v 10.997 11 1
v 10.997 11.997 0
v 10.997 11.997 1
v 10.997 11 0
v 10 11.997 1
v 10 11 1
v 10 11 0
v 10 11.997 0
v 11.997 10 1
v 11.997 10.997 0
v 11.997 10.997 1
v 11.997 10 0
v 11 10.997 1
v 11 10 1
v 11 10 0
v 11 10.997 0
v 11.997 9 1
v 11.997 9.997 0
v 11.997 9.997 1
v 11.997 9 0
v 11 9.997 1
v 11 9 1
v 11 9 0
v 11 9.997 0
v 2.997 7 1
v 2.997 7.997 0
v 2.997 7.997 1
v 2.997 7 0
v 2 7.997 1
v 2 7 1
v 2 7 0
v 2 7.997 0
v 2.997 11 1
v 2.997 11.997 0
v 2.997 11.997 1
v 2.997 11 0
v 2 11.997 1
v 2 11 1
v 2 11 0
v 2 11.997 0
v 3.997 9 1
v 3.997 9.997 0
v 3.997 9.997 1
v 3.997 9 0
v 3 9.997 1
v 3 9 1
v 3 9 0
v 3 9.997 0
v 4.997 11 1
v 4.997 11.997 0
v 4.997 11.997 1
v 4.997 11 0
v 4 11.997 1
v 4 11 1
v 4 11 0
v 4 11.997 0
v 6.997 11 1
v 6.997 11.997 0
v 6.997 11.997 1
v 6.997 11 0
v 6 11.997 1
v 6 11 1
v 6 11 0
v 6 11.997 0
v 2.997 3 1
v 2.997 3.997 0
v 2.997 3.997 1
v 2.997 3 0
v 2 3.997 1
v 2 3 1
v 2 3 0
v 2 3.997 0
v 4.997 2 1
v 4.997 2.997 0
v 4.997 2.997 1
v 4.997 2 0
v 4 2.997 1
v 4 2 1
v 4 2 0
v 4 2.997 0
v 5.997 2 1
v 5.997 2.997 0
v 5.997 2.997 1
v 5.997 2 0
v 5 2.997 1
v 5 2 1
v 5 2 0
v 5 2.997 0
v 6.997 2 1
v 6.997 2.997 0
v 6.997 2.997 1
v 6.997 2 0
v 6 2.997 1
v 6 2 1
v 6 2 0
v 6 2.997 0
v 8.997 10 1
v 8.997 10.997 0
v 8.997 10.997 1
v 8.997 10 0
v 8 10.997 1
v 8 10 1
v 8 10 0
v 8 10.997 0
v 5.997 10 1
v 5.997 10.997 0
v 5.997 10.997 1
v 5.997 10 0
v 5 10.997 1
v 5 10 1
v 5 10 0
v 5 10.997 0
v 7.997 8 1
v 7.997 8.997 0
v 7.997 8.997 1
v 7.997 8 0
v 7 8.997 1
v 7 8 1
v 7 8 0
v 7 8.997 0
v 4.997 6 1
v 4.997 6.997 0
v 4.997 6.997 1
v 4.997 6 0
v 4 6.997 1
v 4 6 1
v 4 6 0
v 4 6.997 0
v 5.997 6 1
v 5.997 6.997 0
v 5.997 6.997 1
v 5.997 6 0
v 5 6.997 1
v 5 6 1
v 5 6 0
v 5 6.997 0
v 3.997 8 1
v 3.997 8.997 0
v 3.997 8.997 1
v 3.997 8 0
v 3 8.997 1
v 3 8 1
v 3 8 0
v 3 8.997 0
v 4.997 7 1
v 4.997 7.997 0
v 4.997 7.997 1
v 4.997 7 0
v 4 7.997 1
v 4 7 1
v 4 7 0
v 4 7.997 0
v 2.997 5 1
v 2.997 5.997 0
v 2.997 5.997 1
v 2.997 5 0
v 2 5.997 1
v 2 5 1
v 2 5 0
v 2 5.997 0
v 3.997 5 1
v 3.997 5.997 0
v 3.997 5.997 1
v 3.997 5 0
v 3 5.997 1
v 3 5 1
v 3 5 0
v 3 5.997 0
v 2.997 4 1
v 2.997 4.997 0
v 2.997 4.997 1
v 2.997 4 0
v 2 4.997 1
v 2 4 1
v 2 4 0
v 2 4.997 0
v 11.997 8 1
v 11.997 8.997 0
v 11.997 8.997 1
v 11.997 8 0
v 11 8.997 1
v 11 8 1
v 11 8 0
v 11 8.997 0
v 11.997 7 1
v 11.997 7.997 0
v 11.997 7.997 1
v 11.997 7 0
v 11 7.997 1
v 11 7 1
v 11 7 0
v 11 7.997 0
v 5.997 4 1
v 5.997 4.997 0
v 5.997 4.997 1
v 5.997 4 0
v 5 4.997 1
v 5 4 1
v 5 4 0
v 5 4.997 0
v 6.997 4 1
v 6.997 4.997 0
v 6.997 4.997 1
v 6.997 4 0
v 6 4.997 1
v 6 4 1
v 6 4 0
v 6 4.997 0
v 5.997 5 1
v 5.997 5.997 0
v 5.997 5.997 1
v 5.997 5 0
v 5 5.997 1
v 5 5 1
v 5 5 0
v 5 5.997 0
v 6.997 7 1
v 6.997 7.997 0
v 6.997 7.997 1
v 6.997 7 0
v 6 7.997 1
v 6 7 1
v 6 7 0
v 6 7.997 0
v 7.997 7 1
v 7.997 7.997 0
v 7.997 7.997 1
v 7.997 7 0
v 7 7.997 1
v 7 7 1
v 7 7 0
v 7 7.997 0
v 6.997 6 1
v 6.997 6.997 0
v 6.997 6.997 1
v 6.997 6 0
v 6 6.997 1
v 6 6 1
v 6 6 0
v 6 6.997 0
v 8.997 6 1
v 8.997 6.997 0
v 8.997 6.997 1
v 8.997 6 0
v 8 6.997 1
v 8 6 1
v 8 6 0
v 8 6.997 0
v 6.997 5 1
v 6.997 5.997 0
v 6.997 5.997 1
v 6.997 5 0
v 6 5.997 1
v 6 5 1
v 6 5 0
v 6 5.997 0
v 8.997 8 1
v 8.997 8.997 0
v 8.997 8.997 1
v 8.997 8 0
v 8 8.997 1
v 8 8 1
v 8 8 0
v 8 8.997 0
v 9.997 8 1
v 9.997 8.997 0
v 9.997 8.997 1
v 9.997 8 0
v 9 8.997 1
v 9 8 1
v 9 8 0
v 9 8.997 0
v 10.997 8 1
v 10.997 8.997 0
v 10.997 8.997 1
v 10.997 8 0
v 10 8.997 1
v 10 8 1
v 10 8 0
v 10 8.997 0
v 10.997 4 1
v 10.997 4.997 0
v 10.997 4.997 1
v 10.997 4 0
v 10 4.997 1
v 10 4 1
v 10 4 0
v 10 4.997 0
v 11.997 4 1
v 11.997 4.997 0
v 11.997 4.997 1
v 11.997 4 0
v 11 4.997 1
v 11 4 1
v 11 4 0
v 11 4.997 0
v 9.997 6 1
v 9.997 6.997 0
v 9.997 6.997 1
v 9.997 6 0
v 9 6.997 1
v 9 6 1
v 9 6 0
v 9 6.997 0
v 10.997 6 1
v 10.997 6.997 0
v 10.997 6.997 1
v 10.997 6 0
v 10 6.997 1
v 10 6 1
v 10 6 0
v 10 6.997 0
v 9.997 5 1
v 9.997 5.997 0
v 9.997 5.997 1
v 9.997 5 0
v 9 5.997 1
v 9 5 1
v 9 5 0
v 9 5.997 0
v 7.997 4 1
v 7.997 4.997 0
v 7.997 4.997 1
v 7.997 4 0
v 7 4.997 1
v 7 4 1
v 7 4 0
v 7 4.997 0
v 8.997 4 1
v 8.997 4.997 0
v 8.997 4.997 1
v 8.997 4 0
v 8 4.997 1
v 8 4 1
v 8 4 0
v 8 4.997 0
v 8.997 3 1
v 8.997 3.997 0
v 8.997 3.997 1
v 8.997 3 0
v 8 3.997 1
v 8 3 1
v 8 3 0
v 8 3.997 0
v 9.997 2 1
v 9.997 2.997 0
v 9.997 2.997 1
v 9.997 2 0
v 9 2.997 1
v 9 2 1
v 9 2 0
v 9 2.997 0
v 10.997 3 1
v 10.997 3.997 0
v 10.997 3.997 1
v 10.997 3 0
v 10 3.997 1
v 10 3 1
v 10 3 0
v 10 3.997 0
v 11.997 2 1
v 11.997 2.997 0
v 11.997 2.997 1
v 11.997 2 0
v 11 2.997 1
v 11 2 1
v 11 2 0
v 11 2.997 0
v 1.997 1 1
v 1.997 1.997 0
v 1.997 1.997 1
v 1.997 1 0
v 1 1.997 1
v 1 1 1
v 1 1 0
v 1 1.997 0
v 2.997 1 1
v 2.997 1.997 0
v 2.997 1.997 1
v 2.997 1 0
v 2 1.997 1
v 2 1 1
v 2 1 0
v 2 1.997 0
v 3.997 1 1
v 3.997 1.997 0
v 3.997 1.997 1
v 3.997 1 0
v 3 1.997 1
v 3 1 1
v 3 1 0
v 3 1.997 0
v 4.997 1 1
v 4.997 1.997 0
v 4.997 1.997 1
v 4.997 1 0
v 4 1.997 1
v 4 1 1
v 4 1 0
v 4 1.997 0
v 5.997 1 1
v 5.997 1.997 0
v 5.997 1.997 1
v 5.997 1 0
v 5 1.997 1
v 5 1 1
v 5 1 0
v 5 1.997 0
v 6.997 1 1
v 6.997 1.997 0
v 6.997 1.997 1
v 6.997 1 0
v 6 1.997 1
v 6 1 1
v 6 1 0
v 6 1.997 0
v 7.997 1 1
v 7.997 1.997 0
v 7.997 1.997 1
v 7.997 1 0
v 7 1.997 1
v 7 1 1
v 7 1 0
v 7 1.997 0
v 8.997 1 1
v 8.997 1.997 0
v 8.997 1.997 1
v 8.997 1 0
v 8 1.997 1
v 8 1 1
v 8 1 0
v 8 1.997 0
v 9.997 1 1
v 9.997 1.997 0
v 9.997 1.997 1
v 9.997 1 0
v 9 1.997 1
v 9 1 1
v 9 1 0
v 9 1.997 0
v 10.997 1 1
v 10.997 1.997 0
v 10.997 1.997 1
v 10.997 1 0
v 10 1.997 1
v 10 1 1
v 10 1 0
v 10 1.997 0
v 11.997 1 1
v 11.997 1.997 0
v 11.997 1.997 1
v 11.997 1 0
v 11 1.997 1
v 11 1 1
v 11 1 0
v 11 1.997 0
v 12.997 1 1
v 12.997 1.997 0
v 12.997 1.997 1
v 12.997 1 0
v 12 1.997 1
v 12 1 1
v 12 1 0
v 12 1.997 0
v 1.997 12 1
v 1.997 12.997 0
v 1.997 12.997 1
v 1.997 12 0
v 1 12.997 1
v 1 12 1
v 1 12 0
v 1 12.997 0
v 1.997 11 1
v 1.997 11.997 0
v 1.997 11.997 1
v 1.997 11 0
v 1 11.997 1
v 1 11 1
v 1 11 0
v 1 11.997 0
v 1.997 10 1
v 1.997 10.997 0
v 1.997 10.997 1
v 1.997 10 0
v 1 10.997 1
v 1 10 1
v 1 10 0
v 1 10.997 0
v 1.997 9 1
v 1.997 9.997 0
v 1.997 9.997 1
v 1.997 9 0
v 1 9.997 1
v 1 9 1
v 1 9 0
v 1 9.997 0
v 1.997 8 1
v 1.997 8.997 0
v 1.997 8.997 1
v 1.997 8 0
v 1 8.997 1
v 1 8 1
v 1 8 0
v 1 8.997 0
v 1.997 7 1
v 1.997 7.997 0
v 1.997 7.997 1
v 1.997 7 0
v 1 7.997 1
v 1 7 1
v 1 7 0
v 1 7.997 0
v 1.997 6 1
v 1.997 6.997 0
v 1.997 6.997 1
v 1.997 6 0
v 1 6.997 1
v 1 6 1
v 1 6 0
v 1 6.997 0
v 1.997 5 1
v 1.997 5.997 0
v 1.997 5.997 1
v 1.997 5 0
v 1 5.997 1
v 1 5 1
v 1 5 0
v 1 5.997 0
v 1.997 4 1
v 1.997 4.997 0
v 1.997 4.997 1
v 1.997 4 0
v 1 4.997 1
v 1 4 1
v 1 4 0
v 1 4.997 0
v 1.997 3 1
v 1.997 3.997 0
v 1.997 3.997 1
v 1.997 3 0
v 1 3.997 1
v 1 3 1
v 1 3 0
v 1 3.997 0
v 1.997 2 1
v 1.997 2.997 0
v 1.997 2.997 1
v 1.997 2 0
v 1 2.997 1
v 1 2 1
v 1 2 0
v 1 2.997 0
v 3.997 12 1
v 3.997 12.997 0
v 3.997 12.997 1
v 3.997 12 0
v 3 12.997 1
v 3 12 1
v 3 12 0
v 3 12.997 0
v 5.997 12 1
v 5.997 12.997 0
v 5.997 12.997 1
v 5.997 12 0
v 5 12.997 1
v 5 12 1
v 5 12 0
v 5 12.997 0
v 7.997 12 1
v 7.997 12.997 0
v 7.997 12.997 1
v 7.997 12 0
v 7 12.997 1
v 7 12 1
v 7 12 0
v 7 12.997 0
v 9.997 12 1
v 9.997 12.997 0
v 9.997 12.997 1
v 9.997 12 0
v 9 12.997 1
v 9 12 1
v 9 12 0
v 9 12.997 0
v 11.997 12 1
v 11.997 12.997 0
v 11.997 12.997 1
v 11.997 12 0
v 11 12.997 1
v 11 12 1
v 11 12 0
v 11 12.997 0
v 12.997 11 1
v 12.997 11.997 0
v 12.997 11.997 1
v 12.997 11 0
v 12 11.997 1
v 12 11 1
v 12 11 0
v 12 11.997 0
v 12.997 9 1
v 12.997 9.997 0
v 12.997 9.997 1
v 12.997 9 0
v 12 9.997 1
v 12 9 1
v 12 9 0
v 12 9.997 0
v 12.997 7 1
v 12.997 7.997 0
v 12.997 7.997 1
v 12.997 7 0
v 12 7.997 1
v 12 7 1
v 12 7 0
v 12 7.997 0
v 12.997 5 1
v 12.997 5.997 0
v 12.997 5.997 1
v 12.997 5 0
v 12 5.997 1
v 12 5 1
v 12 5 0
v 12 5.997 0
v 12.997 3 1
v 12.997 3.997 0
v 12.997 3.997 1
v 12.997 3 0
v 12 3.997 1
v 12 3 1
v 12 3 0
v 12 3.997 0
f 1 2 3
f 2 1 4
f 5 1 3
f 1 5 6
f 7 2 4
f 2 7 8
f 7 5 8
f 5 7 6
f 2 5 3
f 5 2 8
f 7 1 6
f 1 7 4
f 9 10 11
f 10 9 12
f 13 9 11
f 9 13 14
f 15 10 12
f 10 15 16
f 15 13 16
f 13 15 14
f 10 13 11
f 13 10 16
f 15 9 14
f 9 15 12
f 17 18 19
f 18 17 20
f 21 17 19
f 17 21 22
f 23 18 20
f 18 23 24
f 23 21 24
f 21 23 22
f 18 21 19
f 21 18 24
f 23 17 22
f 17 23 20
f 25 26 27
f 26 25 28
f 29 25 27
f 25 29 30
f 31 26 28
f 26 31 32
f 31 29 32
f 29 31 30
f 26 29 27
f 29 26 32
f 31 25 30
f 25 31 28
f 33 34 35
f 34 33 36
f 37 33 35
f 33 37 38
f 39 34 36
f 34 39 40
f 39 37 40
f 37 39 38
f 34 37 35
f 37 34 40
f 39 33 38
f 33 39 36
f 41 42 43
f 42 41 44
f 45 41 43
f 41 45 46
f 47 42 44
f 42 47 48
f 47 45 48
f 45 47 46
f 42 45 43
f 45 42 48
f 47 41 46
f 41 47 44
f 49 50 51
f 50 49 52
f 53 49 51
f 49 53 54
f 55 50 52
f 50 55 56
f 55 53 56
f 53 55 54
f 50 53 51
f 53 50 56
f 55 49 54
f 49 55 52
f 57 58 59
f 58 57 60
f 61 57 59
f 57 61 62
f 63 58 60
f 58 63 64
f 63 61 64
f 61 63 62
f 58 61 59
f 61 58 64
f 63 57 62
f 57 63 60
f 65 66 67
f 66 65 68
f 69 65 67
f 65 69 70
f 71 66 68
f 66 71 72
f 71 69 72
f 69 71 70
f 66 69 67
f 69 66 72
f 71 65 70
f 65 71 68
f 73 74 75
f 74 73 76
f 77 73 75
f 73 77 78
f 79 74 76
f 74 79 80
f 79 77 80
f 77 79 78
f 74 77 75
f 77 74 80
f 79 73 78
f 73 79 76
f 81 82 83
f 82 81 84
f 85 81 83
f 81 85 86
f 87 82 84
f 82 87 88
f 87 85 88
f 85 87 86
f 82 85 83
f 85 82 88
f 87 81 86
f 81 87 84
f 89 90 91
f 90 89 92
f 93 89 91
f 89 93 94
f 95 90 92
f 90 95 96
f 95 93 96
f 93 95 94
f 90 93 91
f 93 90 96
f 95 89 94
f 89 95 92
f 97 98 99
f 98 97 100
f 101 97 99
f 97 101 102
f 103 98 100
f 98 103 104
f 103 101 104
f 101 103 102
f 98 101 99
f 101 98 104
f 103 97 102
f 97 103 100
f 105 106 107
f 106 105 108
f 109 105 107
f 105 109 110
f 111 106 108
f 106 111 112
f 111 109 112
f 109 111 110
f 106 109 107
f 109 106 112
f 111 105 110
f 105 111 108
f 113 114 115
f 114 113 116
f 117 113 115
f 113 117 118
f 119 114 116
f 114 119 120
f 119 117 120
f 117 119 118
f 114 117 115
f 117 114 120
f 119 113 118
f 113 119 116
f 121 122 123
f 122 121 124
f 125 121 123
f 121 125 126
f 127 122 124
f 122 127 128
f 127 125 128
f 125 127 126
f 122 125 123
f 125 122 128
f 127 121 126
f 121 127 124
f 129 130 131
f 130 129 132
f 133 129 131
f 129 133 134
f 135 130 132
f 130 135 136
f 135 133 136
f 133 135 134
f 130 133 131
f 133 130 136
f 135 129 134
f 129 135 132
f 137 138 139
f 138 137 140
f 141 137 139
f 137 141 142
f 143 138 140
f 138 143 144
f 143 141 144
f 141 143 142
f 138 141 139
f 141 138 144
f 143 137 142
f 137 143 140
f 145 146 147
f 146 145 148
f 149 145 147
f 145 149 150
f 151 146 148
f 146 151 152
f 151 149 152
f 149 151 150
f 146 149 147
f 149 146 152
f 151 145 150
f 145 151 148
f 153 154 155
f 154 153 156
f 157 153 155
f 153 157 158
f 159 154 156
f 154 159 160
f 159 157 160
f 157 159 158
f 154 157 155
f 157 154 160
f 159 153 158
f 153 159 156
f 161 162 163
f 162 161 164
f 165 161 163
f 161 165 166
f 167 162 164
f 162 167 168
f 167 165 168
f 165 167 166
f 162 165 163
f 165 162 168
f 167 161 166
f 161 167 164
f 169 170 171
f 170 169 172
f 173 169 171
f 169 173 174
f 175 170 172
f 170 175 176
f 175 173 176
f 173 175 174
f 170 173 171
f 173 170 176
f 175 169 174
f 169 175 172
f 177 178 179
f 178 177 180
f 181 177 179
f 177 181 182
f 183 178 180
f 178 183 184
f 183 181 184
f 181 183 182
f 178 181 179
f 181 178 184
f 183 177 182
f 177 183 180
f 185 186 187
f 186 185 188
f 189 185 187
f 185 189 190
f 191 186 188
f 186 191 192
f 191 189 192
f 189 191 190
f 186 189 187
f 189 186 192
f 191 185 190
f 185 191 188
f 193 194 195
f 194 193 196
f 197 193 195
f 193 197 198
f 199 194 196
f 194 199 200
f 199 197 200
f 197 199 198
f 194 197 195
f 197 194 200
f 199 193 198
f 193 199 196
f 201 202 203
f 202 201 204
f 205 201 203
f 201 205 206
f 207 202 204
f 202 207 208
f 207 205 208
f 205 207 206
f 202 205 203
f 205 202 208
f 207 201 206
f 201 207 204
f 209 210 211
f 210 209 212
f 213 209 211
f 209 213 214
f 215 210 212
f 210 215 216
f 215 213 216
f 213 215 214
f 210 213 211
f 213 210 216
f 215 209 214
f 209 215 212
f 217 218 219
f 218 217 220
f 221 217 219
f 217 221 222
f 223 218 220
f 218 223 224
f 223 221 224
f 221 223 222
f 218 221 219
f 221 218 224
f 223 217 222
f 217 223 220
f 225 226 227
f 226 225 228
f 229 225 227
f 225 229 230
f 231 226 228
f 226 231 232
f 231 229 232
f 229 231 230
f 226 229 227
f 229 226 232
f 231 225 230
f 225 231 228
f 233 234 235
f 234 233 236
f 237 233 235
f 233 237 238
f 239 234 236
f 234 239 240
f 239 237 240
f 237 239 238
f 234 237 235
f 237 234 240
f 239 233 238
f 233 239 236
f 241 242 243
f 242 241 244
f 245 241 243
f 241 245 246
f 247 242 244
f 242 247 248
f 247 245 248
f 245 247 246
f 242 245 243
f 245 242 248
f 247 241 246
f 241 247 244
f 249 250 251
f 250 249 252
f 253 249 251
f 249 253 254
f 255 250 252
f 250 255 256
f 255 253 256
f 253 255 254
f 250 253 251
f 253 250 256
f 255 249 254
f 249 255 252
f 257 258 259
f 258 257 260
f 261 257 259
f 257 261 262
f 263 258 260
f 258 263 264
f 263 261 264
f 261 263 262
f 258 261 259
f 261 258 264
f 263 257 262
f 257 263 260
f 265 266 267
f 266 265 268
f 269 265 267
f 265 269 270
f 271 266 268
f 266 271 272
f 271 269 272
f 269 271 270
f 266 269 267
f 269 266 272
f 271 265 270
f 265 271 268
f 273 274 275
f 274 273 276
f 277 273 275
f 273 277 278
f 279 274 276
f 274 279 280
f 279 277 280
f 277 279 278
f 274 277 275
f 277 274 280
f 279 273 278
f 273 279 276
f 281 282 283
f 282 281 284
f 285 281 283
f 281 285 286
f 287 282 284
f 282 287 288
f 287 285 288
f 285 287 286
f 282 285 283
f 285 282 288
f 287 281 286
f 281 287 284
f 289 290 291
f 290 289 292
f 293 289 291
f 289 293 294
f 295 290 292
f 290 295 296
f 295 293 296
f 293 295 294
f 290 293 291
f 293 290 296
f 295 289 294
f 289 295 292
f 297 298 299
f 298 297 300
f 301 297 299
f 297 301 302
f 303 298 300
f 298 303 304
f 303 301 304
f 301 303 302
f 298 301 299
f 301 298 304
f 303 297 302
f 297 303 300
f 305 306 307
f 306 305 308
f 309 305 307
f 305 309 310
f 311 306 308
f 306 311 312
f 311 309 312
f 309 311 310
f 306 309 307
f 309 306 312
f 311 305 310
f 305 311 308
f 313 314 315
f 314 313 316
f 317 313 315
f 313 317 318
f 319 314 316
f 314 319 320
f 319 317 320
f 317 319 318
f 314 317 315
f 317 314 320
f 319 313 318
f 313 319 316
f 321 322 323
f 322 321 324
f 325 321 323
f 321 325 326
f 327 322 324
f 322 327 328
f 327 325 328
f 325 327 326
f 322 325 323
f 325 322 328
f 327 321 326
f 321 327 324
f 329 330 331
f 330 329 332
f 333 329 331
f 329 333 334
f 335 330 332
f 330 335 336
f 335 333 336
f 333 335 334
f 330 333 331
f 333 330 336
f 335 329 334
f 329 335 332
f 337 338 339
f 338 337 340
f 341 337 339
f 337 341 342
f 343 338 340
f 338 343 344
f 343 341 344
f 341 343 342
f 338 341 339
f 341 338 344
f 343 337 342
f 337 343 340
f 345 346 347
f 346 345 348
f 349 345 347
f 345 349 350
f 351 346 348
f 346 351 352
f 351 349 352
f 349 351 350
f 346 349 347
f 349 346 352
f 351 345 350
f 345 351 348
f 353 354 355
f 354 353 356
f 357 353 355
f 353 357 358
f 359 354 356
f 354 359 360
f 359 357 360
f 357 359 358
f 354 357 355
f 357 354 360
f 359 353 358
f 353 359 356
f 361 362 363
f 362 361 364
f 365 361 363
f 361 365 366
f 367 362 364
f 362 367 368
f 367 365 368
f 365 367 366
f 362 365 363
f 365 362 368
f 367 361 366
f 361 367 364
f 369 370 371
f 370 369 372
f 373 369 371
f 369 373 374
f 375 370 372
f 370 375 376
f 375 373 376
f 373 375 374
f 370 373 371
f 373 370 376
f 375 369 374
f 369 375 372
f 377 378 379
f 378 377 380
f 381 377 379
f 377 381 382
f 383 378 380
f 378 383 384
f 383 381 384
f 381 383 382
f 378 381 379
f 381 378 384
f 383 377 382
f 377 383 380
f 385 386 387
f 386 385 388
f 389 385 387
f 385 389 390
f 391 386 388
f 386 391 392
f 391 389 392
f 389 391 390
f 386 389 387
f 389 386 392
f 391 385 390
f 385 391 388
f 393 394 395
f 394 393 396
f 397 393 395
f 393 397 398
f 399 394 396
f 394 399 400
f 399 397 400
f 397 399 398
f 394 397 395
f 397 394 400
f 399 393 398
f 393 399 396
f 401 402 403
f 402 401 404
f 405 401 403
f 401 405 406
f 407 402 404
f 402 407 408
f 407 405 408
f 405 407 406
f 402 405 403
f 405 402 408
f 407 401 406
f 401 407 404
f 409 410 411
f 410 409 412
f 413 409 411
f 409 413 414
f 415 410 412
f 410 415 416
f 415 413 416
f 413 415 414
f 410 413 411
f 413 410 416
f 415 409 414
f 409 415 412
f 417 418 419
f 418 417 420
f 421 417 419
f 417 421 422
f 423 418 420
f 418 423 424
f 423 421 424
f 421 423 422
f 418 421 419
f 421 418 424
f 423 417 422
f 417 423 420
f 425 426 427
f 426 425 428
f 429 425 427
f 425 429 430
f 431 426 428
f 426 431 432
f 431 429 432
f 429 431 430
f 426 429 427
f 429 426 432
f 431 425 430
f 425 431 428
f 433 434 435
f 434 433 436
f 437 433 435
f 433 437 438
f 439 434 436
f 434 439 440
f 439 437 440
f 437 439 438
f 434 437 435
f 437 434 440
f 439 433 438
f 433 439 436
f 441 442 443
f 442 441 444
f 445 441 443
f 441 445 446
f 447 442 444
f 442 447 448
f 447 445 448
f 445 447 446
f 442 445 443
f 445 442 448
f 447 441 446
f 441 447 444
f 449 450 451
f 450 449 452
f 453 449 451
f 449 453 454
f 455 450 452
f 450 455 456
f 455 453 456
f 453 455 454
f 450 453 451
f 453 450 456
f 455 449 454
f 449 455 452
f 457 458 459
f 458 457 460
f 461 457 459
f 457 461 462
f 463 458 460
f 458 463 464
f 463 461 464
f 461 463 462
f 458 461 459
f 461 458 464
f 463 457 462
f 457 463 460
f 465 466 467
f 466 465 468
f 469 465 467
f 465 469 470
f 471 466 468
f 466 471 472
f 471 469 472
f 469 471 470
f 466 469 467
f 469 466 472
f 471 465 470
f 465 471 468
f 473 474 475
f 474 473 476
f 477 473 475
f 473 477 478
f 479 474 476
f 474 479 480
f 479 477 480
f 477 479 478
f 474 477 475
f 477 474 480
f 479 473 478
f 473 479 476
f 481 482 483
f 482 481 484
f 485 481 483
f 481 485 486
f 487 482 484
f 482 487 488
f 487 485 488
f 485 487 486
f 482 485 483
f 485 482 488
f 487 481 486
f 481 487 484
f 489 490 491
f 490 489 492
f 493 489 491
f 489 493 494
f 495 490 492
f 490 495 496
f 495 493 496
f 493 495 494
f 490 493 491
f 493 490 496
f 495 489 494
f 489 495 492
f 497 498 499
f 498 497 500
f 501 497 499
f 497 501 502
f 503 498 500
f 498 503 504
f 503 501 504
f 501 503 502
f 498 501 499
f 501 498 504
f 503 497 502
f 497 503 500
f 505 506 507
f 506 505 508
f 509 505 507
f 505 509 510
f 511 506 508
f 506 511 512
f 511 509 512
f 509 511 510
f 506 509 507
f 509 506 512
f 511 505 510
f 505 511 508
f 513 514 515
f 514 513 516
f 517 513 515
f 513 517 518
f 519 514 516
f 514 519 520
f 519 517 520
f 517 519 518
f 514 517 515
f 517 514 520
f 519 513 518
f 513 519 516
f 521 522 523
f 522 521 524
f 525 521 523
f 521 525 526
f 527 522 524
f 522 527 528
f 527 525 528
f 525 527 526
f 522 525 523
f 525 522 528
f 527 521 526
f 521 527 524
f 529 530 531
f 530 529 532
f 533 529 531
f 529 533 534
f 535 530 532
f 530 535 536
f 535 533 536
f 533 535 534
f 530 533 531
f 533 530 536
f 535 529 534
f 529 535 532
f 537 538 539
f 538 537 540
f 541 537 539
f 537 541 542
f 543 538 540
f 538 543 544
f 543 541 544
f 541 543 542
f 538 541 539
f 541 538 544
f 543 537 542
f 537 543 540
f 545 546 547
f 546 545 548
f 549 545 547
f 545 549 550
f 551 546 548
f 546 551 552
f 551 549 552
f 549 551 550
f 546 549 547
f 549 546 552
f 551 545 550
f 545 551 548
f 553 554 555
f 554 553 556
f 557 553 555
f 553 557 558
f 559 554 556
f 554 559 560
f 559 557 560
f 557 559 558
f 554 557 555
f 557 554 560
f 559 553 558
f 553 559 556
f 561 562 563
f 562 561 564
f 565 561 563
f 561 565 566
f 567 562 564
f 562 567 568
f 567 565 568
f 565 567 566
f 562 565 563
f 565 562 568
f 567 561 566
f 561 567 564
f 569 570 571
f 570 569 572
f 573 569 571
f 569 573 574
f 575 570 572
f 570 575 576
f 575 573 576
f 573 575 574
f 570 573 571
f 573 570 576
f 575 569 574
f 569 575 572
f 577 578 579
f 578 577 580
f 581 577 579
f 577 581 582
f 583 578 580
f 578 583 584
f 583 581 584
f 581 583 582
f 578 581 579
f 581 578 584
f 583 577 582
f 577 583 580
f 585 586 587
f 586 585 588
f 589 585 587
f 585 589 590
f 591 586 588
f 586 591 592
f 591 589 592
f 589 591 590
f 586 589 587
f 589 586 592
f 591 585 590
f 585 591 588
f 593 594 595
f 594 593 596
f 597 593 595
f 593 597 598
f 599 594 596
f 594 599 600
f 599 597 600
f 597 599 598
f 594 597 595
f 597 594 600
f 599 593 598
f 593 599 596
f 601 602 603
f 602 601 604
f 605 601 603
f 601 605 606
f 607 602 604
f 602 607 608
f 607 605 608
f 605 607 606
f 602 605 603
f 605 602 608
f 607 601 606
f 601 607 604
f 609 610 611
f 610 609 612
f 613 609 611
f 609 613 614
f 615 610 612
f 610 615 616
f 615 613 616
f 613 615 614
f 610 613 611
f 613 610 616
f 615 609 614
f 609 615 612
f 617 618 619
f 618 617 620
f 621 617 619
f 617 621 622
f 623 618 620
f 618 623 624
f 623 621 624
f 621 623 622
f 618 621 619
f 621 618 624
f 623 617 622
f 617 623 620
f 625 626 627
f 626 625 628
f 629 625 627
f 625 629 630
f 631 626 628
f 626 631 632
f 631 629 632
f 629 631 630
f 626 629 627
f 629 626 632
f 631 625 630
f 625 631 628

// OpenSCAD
// file: ../../util/bitmap.scad
/*****************************************************************************
 * Module Bitmap Library
 * Modules to create bitmaps of unit squares from 1 or 2 dimensional vectors.
 *****************************************************************************
 * Copyright 2017 Chris Baker
 *
 * This program is free software: you can redistribute it and/or modify
 * it under the terms of the GNU Lesser General Public License as published by
 * the Free Software Foundation, either version 3 of the License, or
 * (at your option) any later version.
 *
 * This program is distributed in the hope that it will be useful,
 * but WITHOUT ANY WARRANTY; without even the implied warranty of
 * MERCHANTABILITY or FITNESS FOR A PARTICULAR PURPOSE.  See the
 * GNU Lesser General Public License for more details.
 *
 * You should have received a copy of the GNU Lesser General Public License
 * along with this program.  If not, see <http://www.gnu.org/licenses/>.
 *****************************************************************************
 * Usage:
 * Include this file with the "use" tag.
 * Depends on compat.scad library.
 *
 * API:
 *   1dbitmap(bitmap, center, pullback, vector_mode)
 *   2dbitmap(bitmap, center, pullback, vector_mode)
 *     Generate a 1 or 2-Dimensional field of modules based on the provided
 *     bitmap vector. See Bitmap Vectors below.
 *     The center flag determines whether to center the bitmap on the origin.
 *     The pullback value shrinks each module in the x and y dimension by the
 *     specified amount. A negative value will expand the modules so they
 *     blend into each other.
 *     The vector_mode flag determines whether to create 3D solid geometry
 *     (unit cubes) or 2D vector geometry (squares).
 *
 * Bitmap Vectors:
 *   The bitmap vectors primarily provide boolean information.
 *   A module will be placed where these vectors have a postive value and
 *   skipped where they have a negative value. I.E. 0, -1, false, and undef
 *   are all equivalent and result in a skip. 1 and true are equivalent and
 *   result in a placed 1-unit module.
 *   Further, if the value is an integer it will be treated as a height for
 *   the module, allowing z-maps to be created.
 *   If the value is not an integer or boolean, it will be treated as a color
 *   reference. This can be a string or RGBA vector that will be used to
 *   color the module in the OpenSCAD preview window.
 *   In current versions of OpenSCAD, the color has no effect in the rendered
 *   view or STL output.
 *
 * Vector Mode:
 *   Although OpenSCAD supports generating 2D geometry, there are several
 *   caveats:
 *   - 2D and 3D geometry cannot be mixed
 *   - Extruding 2D geometry causes color information to be lost
 *   - All 2D geometry is projected onto the XY plane when rendering
 *   - Rendering also results in loss of color (same as 3D)
 *   - The SVG exporter is somewhat limited:
 *     - The pixel size of the image is hard-coded in the file
 *     - The title of the image is a generic string
 *     - The color selection for stroke and fill is fixed
 *     - The stroke-width is set to a large value that will cause overlap
 *     - The background is transparent
 *     - Only one path element is created with all of the geometry; there is
 *       no easy way to split up the geometry into multiple logical units.
 *     - These issues can mostly be resolved by hand-editing the file:
 *       - Remove or modify the width and height parameters from the svg
 *         element at the top of the file to provide better scaling.
 *       - Edit the title element at the top of the file to change the title.
 *       - Edit the stroke and fill parameters of the path element (these will
 *         probably be at the end of the file).
 *       - Set the stroke-width parameter for the path element to 0.
 *****************************************************************************/
use <compat.scad>

/*
 * 2dbitmap - Turn a 2D vector into a bitmap of cubes
 *
 * bitmap - 2D vector representing where to place each cube
 *          Value can either be boolean, z-height, or color
 * center - center cubes around the origin
 * pullback - size of gap around each pixel (screendoor)
 * vector_mode - create a 2D vector drawing instead of 3D extrusion
 */
module 2dbitmap(bitmap=[[1,0],[0,1]], center=false, pullback=0.003, vector_mode=false)
{
  if (bitmap!=undef) {
	ylen=len(bitmap)-1;

	for (y=[0:ylen]) {
		xlen=len(bitmap[y])-1;
		for (x=[0:xlen])
			translate([x-(center?xlen/2:0),ylen-y-(center?ylen/2:0),0])
				if (is_indexable(bitmap[y][x]))
					color(bitmap[y][x])
						if (vector_mode)
							square([1-pullback,1-pullback], center=center);
						else
							cube([1-pullback,1-pullback,1], center=center);
				else
					if (bitmap[y][x])
						if (vector_mode)
							square([1-pullback,1-pullback], center=center);
						else
							cube([1-pullback,1-pullback,clamp_nonnum(bitmap[y][x])], center=center);
	}
  }
}

module 1dbitmap(bitmap=[1,0,1,0,1], center=false, pullback=-0.003, vector_mode=false)
	if (bitmap!=undef)
		2dbitmap([bitmap], center, pullback, vector_mode);

/*
 * Examples
 */

// 1D with z-height
translate([10,0,0]) scale([1,10,1])
	1dbitmap(bitmap=[1,1,0,2,0,0,3], pullback=.1);

// 1D with boolean
translate([-20,0,0]) scale([1,10,1])
	1dbitmap(bitmap=[true,false,true,false,true,true]);

// 2D with z-height
scale([2,2,1])
	2dbitmap(bitmap=[[1,0,2,1],[0,3,3,0],[1,1,0,1]],
		center=true);

// 1D with color
translate([0,-10,0]) scale([1,3,1])
	1dbitmap(bitmap=["red","white","blue",[0,0.3,0,0.5]]);

// 1D with color using 2D-vector-mode
translate([-7,-8,0]) scale([1,2])
	1dbitmap(bitmap=["red",0,"blue",0,"green"], vector_mode=true);
translate([-4.5,-10,0]) scale([1,2])
	1dbitmap(bitmap=["red",0,"blue",0,"green"], vector_mode=true, center=true);

// Check behavior with undef
1dbitmap(undef);
2dbitmap(undef);
// file: ../../util/bitlib.scad
/*****************************************************************************
 * Bit Manipulation Library
 * Provides some useful bit manipulation functions.
 *****************************************************************************
 * Copyright 2017 Chris Baker
 *
 * This program is free software: you can redistribute it and/or modify
 * it under the terms of the GNU Lesser General Public License as published by
 * the Free Software Foundation, either version 3 of the License, or
 * (at your option) any later version.
 *
 * This program is distributed in the hope that it will be useful,
 * but WITHOUT ANY WARRANTY; without even the implied warranty of
 * MERCHANTABILITY or FITNESS FOR A PARTICULAR PURPOSE.  See the
 * GNU Lesser General Public License for more details.
 *
 * You should have received a copy of the GNU Lesser General Public License
 * along with this program.  If not, see <http://www.gnu.org/licenses/>.
 *****************************************************************************
 * Usage:
 * Include this file with the "use" tag.
 * When run on its own, all echo statements in this library should print
 * "true".
 *
 * API:
 *   bit(v,b)
 *     Return the truth value of the b'th bit of v.
 *
 *   check_bit_size(v,b,signed=false)
 *     Determine whether the value v can be represented with b bits (b must
 *     be positive).
 *     The signed flag indicates whether to include the sign bit in the
 *     determination; otherwise negative values will result in undef being
 *     returned.
 *
 *   xor(a,b)
 *     Return the value of a xor b.
 *     Handles arbitrary size values for a and b.
 *     Handles negative values as expected (a positive result will be returned
 *     unless a and b have differing signs).
 *
 * TODO:
 *  - Change echos to asserts (future OpenSCAD version)
 *  - Add more functions
 *
 *****************************************************************************/

//Return the truth value of the b'th bit of v
function bit(v,b) =
	((v==undef)||(b==undef)||(b<0))?undef:
	(floor(v / pow(2, b)) % 2)?true:false;

echo("*** bit() testcases ***");
echo(0,bit(0,0)==false);
echo(1,bit(-1,0)==true);
echo(2,bit(1,0)==true);
echo(3,[for (i=[0:63]) bit(0,i)]==[for (i=[0:63]) false]); //0=0...0
echo(4,[for (i=[0:63]) bit(-1,i)]==[for (i=[0:63]) true]); //-1=1...1
echo(5,[for (i=[1:63]) bit(1,i)]==[for (i=[1:63]) false]); //1=0...01
echo(6,[for (i=[0:7]) bit(85,i)?1:0]==[1,0,1,0,1,0,1,0]); //85=01010101
echo(7,[for (i=[0:7]) bit(170,i)?1:0]==[0,1,0,1,0,1,0,1]); //170=10101010
echo(8,[for (i=[0:7]) bit(165,i)?1:0]==[1,0,1,0,0,1,0,1]); //165=10100101
echo(9,[for (i=[0:7]) bit(56,i)?1:0]==[0,0,0,1,1,1,0,0]); //56=00111000
echo(10,[for (i=[0:7]) bit(-3,i)?1:0]==[1,0,1,1,1,1,1,1]); //-3=1...101
//(2^64)=0...01 0...0
echo(11,bit(pow(2,64),64)==true);
echo(12,[for (i=[0:63]) bit(pow(2,64),i)]==[for (i=[0:63]) false]);
echo(13,[for (i=[65:127]) bit(pow(2,64),i)]==[for (i=[1:63]) false]);
//-(2^64)=1...1 0...0
echo(14,[for (i=[0:63]) bit(-pow(2,64),i)]==[for (i=[0:63]) false]);
echo(15,[for (i=[64:127]) bit(-pow(2,64),i)]==[for (i=[0:63]) true]);
echo(16,bit(10,-1)==undef);
echo(17,bit(10,undef)==undef);
echo(18,bit(undef,3)==undef);

//return true if v can be represented in b bits
//if signed flag is set. the result will be adjusted
//to account for the needed sign bit
function check_bit_size(v,b,signed=false) =
	(b<0)?undef:
	(v==undef)?undef:
	(b==0)?false:
	(v==0)?true: //(b>0)
	(signed)?
		(v<0)?(-pow(2,b-1)<(v+1)):
			(pow(2,b-1)>(v+1)):
		(v<0)?undef:
			(pow(2,b)>v);

echo("*** check_bit_size() testcases ***");
echo(0,check_bit_size(-1,2)==undef);
echo(1,check_bit_size(2,-4)==undef);
echo(2,check_bit_size(2,-4,signed=true)==undef);
echo(3,check_bit_size(0,0)==false);
echo(4,check_bit_size(0,1)==true);
echo(5,check_bit_size(1,0)==false);
echo(6,check_bit_size(1,1)==true);
echo(7,check_bit_size(7,3)==true);
echo(8,check_bit_size(8,3)==false);
echo(9,check_bit_size(1,3)==true);
echo(10,check_bit_size(256,8)==false);
echo(11,check_bit_size(255,8)==true);
echo(12,check_bit_size(10,2)==false);
echo(13,check_bit_size(10,4)==true);
echo(14,check_bit_size(-10,2,signed=true)==false);
echo(15,check_bit_size(-10,4,signed=true)==false);
echo(16,check_bit_size(-10,5,signed=true)==true);
echo(17,check_bit_size(-1,0,signed=true)==false);
echo(18,check_bit_size(-1,1,signed=true)==true);
echo(19,check_bit_size(0,0,signed=true)==false);
echo(20,check_bit_size(0,1,signed=true)==true);
echo(21,check_bit_size(-2,2,signed=true)==true);
echo(22,check_bit_size(-3,2,signed=true)==false);
echo(23,check_bit_size(-3,3,signed=true)==true);
echo(24,check_bit_size(-8,3,signed=true)==false);
echo(25,check_bit_size(-8,4,signed=true)==true);
echo(26,check_bit_size(undef,4)==undef);
echo(27,check_bit_size(undef,4,signed=true)==undef);

//return the value of a xor b
//runs recursively until all bits of a and b are exhausted
function xor(a,b,i=0) =
	((a==undef)||(b==undef))?undef:
	let (c=bit(a,i), d=bit(b,i),
		 v=((c||d) && !(c&&d))?pow(2,i):0)
		(check_bit_size(a,i,signed=true) &&
		 check_bit_size(b,i,signed=true))?
			-v: //special case for sign bit
			v+xor(a,b,i+1); //recursively add powers of 2

echo("*** xor() testcases ***");
echo(0,xor(42,0)==42);
echo(1,xor(42,42)==0);
echo(2,xor(169,238)==71); //10101001^11101110=01000111=71
echo(3,xor(238,169)==71);
echo(4,xor(42,238)==196); //00101010^11101110=11000100=196
echo(5,xor(169,42)==131); //10101001^00101010=10000011=131
echo(6,xor(-8,-10)==14); //11000^10110=01110=14
echo(7,xor(-7,-10)==15); //11001^10110=01111=15
echo(8,xor(9,-10)==-1); //01001^10110=11111=-1
echo(9,xor(9,-12)==-3); //01001^10100=11101=-3
echo(10,xor(undef,0)==undef);
// file: ../../util/stringlib.scad
/*****************************************************************************
 * String Manipulation Library
 * Provides some useful string manipulation functions.
 *****************************************************************************
 * Copyright 2017 Chris Baker
 *
 * This program is free software: you can redistribute it and/or modify
 * it under the terms of the GNU Lesser General Public License as published by
 * the Free Software Foundation, either version 3 of the License, or
 * (at your option) any later version.
 *
 * This program is distributed in the hope that it will be useful,
 * but WITHOUT ANY WARRANTY; without even the implied warranty of
 * MERCHANTABILITY or FITNESS FOR A PARTICULAR PURPOSE.  See the
 * GNU Lesser General Public License for more details.
 *
 * You should have received a copy of the GNU Lesser General Public License
 * along with this program.  If not, see <http://www.gnu.org/licenses/>.
 *****************************************************************************
 * Usage:
 * Include this file with the "use" tag.
 * Depends on compat.scad library.
 *
 * API:
 *   atoi(a)
 *     Convert the string of numerals, a, to a vector of individual decimal
 *     numbers.
 *
 *   ascii_to_vec(a)
 *     Convert the ASCII string, a, into a vector of decimal numbers.
 *
 *****************************************************************************/
use <compat.scad>

/*
 * atoi - convert ASCII numerals to a vector of individual decimal numbers
 *
 * a - the ASCII string of numerals
 */
function atoi(a) = (isa_string(a))?
	[
		let (val = search(a, "0123456789"))
			for (i = val) i
	]
	:
	undef;

/* *** atoi() testcases *** */
do_assert(atoi(undef)==undef,     "atoi test 00");
do_assert(atoi(true)==undef,      "atoi test 01");
do_assert(atoi(false)==undef,     "atoi test 02");
do_assert(atoi([])==undef,        "atoi test 03");
do_assert(atoi([1,2,3])==undef,   "atoi test 04");
do_assert(atoi("")==[],           "atoi test 05");
do_assert(atoi("0")==[0],         "atoi test 06");
do_assert(atoi("1")==[1],         "atoi test 07");
do_assert(atoi("2")==[2],         "atoi test 08");
do_assert(atoi("3")==[3],         "atoi test 09");
do_assert(atoi("4")==[4],         "atoi test 10");
do_assert(atoi("5")==[5],         "atoi test 11");
do_assert(atoi("6")==[6],         "atoi test 12");
do_assert(atoi("7")==[7],         "atoi test 13");
do_assert(atoi("8")==[8],         "atoi test 14");
do_assert(atoi("9")==[9],         "atoi test 15");
do_assert(atoi("123")==[1,2,3],   "atoi test 16");
do_assert(atoi("1a23b")==[1,2,3], "atoi test 17"); //degenerate case, don't really care too much about the result

/*
 * ascii_to_vec - convert ASCII string to decimal vector
 *
 * a - the ASCII string to vectorize
 */
function ascii_to_vec(a) = (isa_string(a))?
	[
		let (val = search(a, "\x01\x02\x03\x04\x05\x06\x07\x08\x09\x0a\x0b\x0c\x0d\x0e\x0f\x10\x11\x12\x13\x14\x15\x16\x17\x18\x19\x1a\x1b\x1c\x1d\x1e\x1f !\"#$%&'()*+,-./0123456789:;<=>?@ABCDEFGHIJKLMNOPQRSTUVWXYZ[\\]^_`abcdefghijklmnopqrstuvwxyz{|}~\x7f"))
			for (i = val) i+1
	]:
	undef;

/* *** ascii_to_vec() testcases *** */
do_assert(ascii_to_vec(undef)==undef,   "ascii_to_vec test 01");
do_assert(ascii_to_vec(true)==undef,    "ascii_to_vec test 02");
do_assert(ascii_to_vec(false)==undef,   "ascii_to_vec test 03");
do_assert(ascii_to_vec([])==undef,      "ascii_to_vec test 04");
do_assert(ascii_to_vec([1,2,3])==undef, "ascii_to_vec test 05");
do_assert(ascii_to_vec("")==[],         "ascii_to_vec test 06");
do_assert(ascii_to_vec("0")==[48],      "ascii_to_vec test 07");
do_assert(ascii_to_vec("a")==[97],      "ascii_to_vec test 08");
do_assert(ascii_to_vec("0123456789")==[48,49,50,51,52,53,54,55,56,57],
	"ascii_to_vec test 09");
do_assert(ascii_to_vec("The quick brown fox jumped over the lazy dog.")
	==[84,104,101,32,113,117,105,99,107,32,98,114,111,119,110,32,102,111,120,32,106,117,109,112,101,100,32,111,118,101,114,32,116,104,101,32,108,97,122,121,32,100,111,103,46],
	"ascii_to_vec test 10");
// main file
/* Unit Test 02: 12x12 - 5 data bytes, 7 ecc bytes */
use <../datamatrix.scad>
data_matrix(dm_ascii("17001164"), mark="black");
